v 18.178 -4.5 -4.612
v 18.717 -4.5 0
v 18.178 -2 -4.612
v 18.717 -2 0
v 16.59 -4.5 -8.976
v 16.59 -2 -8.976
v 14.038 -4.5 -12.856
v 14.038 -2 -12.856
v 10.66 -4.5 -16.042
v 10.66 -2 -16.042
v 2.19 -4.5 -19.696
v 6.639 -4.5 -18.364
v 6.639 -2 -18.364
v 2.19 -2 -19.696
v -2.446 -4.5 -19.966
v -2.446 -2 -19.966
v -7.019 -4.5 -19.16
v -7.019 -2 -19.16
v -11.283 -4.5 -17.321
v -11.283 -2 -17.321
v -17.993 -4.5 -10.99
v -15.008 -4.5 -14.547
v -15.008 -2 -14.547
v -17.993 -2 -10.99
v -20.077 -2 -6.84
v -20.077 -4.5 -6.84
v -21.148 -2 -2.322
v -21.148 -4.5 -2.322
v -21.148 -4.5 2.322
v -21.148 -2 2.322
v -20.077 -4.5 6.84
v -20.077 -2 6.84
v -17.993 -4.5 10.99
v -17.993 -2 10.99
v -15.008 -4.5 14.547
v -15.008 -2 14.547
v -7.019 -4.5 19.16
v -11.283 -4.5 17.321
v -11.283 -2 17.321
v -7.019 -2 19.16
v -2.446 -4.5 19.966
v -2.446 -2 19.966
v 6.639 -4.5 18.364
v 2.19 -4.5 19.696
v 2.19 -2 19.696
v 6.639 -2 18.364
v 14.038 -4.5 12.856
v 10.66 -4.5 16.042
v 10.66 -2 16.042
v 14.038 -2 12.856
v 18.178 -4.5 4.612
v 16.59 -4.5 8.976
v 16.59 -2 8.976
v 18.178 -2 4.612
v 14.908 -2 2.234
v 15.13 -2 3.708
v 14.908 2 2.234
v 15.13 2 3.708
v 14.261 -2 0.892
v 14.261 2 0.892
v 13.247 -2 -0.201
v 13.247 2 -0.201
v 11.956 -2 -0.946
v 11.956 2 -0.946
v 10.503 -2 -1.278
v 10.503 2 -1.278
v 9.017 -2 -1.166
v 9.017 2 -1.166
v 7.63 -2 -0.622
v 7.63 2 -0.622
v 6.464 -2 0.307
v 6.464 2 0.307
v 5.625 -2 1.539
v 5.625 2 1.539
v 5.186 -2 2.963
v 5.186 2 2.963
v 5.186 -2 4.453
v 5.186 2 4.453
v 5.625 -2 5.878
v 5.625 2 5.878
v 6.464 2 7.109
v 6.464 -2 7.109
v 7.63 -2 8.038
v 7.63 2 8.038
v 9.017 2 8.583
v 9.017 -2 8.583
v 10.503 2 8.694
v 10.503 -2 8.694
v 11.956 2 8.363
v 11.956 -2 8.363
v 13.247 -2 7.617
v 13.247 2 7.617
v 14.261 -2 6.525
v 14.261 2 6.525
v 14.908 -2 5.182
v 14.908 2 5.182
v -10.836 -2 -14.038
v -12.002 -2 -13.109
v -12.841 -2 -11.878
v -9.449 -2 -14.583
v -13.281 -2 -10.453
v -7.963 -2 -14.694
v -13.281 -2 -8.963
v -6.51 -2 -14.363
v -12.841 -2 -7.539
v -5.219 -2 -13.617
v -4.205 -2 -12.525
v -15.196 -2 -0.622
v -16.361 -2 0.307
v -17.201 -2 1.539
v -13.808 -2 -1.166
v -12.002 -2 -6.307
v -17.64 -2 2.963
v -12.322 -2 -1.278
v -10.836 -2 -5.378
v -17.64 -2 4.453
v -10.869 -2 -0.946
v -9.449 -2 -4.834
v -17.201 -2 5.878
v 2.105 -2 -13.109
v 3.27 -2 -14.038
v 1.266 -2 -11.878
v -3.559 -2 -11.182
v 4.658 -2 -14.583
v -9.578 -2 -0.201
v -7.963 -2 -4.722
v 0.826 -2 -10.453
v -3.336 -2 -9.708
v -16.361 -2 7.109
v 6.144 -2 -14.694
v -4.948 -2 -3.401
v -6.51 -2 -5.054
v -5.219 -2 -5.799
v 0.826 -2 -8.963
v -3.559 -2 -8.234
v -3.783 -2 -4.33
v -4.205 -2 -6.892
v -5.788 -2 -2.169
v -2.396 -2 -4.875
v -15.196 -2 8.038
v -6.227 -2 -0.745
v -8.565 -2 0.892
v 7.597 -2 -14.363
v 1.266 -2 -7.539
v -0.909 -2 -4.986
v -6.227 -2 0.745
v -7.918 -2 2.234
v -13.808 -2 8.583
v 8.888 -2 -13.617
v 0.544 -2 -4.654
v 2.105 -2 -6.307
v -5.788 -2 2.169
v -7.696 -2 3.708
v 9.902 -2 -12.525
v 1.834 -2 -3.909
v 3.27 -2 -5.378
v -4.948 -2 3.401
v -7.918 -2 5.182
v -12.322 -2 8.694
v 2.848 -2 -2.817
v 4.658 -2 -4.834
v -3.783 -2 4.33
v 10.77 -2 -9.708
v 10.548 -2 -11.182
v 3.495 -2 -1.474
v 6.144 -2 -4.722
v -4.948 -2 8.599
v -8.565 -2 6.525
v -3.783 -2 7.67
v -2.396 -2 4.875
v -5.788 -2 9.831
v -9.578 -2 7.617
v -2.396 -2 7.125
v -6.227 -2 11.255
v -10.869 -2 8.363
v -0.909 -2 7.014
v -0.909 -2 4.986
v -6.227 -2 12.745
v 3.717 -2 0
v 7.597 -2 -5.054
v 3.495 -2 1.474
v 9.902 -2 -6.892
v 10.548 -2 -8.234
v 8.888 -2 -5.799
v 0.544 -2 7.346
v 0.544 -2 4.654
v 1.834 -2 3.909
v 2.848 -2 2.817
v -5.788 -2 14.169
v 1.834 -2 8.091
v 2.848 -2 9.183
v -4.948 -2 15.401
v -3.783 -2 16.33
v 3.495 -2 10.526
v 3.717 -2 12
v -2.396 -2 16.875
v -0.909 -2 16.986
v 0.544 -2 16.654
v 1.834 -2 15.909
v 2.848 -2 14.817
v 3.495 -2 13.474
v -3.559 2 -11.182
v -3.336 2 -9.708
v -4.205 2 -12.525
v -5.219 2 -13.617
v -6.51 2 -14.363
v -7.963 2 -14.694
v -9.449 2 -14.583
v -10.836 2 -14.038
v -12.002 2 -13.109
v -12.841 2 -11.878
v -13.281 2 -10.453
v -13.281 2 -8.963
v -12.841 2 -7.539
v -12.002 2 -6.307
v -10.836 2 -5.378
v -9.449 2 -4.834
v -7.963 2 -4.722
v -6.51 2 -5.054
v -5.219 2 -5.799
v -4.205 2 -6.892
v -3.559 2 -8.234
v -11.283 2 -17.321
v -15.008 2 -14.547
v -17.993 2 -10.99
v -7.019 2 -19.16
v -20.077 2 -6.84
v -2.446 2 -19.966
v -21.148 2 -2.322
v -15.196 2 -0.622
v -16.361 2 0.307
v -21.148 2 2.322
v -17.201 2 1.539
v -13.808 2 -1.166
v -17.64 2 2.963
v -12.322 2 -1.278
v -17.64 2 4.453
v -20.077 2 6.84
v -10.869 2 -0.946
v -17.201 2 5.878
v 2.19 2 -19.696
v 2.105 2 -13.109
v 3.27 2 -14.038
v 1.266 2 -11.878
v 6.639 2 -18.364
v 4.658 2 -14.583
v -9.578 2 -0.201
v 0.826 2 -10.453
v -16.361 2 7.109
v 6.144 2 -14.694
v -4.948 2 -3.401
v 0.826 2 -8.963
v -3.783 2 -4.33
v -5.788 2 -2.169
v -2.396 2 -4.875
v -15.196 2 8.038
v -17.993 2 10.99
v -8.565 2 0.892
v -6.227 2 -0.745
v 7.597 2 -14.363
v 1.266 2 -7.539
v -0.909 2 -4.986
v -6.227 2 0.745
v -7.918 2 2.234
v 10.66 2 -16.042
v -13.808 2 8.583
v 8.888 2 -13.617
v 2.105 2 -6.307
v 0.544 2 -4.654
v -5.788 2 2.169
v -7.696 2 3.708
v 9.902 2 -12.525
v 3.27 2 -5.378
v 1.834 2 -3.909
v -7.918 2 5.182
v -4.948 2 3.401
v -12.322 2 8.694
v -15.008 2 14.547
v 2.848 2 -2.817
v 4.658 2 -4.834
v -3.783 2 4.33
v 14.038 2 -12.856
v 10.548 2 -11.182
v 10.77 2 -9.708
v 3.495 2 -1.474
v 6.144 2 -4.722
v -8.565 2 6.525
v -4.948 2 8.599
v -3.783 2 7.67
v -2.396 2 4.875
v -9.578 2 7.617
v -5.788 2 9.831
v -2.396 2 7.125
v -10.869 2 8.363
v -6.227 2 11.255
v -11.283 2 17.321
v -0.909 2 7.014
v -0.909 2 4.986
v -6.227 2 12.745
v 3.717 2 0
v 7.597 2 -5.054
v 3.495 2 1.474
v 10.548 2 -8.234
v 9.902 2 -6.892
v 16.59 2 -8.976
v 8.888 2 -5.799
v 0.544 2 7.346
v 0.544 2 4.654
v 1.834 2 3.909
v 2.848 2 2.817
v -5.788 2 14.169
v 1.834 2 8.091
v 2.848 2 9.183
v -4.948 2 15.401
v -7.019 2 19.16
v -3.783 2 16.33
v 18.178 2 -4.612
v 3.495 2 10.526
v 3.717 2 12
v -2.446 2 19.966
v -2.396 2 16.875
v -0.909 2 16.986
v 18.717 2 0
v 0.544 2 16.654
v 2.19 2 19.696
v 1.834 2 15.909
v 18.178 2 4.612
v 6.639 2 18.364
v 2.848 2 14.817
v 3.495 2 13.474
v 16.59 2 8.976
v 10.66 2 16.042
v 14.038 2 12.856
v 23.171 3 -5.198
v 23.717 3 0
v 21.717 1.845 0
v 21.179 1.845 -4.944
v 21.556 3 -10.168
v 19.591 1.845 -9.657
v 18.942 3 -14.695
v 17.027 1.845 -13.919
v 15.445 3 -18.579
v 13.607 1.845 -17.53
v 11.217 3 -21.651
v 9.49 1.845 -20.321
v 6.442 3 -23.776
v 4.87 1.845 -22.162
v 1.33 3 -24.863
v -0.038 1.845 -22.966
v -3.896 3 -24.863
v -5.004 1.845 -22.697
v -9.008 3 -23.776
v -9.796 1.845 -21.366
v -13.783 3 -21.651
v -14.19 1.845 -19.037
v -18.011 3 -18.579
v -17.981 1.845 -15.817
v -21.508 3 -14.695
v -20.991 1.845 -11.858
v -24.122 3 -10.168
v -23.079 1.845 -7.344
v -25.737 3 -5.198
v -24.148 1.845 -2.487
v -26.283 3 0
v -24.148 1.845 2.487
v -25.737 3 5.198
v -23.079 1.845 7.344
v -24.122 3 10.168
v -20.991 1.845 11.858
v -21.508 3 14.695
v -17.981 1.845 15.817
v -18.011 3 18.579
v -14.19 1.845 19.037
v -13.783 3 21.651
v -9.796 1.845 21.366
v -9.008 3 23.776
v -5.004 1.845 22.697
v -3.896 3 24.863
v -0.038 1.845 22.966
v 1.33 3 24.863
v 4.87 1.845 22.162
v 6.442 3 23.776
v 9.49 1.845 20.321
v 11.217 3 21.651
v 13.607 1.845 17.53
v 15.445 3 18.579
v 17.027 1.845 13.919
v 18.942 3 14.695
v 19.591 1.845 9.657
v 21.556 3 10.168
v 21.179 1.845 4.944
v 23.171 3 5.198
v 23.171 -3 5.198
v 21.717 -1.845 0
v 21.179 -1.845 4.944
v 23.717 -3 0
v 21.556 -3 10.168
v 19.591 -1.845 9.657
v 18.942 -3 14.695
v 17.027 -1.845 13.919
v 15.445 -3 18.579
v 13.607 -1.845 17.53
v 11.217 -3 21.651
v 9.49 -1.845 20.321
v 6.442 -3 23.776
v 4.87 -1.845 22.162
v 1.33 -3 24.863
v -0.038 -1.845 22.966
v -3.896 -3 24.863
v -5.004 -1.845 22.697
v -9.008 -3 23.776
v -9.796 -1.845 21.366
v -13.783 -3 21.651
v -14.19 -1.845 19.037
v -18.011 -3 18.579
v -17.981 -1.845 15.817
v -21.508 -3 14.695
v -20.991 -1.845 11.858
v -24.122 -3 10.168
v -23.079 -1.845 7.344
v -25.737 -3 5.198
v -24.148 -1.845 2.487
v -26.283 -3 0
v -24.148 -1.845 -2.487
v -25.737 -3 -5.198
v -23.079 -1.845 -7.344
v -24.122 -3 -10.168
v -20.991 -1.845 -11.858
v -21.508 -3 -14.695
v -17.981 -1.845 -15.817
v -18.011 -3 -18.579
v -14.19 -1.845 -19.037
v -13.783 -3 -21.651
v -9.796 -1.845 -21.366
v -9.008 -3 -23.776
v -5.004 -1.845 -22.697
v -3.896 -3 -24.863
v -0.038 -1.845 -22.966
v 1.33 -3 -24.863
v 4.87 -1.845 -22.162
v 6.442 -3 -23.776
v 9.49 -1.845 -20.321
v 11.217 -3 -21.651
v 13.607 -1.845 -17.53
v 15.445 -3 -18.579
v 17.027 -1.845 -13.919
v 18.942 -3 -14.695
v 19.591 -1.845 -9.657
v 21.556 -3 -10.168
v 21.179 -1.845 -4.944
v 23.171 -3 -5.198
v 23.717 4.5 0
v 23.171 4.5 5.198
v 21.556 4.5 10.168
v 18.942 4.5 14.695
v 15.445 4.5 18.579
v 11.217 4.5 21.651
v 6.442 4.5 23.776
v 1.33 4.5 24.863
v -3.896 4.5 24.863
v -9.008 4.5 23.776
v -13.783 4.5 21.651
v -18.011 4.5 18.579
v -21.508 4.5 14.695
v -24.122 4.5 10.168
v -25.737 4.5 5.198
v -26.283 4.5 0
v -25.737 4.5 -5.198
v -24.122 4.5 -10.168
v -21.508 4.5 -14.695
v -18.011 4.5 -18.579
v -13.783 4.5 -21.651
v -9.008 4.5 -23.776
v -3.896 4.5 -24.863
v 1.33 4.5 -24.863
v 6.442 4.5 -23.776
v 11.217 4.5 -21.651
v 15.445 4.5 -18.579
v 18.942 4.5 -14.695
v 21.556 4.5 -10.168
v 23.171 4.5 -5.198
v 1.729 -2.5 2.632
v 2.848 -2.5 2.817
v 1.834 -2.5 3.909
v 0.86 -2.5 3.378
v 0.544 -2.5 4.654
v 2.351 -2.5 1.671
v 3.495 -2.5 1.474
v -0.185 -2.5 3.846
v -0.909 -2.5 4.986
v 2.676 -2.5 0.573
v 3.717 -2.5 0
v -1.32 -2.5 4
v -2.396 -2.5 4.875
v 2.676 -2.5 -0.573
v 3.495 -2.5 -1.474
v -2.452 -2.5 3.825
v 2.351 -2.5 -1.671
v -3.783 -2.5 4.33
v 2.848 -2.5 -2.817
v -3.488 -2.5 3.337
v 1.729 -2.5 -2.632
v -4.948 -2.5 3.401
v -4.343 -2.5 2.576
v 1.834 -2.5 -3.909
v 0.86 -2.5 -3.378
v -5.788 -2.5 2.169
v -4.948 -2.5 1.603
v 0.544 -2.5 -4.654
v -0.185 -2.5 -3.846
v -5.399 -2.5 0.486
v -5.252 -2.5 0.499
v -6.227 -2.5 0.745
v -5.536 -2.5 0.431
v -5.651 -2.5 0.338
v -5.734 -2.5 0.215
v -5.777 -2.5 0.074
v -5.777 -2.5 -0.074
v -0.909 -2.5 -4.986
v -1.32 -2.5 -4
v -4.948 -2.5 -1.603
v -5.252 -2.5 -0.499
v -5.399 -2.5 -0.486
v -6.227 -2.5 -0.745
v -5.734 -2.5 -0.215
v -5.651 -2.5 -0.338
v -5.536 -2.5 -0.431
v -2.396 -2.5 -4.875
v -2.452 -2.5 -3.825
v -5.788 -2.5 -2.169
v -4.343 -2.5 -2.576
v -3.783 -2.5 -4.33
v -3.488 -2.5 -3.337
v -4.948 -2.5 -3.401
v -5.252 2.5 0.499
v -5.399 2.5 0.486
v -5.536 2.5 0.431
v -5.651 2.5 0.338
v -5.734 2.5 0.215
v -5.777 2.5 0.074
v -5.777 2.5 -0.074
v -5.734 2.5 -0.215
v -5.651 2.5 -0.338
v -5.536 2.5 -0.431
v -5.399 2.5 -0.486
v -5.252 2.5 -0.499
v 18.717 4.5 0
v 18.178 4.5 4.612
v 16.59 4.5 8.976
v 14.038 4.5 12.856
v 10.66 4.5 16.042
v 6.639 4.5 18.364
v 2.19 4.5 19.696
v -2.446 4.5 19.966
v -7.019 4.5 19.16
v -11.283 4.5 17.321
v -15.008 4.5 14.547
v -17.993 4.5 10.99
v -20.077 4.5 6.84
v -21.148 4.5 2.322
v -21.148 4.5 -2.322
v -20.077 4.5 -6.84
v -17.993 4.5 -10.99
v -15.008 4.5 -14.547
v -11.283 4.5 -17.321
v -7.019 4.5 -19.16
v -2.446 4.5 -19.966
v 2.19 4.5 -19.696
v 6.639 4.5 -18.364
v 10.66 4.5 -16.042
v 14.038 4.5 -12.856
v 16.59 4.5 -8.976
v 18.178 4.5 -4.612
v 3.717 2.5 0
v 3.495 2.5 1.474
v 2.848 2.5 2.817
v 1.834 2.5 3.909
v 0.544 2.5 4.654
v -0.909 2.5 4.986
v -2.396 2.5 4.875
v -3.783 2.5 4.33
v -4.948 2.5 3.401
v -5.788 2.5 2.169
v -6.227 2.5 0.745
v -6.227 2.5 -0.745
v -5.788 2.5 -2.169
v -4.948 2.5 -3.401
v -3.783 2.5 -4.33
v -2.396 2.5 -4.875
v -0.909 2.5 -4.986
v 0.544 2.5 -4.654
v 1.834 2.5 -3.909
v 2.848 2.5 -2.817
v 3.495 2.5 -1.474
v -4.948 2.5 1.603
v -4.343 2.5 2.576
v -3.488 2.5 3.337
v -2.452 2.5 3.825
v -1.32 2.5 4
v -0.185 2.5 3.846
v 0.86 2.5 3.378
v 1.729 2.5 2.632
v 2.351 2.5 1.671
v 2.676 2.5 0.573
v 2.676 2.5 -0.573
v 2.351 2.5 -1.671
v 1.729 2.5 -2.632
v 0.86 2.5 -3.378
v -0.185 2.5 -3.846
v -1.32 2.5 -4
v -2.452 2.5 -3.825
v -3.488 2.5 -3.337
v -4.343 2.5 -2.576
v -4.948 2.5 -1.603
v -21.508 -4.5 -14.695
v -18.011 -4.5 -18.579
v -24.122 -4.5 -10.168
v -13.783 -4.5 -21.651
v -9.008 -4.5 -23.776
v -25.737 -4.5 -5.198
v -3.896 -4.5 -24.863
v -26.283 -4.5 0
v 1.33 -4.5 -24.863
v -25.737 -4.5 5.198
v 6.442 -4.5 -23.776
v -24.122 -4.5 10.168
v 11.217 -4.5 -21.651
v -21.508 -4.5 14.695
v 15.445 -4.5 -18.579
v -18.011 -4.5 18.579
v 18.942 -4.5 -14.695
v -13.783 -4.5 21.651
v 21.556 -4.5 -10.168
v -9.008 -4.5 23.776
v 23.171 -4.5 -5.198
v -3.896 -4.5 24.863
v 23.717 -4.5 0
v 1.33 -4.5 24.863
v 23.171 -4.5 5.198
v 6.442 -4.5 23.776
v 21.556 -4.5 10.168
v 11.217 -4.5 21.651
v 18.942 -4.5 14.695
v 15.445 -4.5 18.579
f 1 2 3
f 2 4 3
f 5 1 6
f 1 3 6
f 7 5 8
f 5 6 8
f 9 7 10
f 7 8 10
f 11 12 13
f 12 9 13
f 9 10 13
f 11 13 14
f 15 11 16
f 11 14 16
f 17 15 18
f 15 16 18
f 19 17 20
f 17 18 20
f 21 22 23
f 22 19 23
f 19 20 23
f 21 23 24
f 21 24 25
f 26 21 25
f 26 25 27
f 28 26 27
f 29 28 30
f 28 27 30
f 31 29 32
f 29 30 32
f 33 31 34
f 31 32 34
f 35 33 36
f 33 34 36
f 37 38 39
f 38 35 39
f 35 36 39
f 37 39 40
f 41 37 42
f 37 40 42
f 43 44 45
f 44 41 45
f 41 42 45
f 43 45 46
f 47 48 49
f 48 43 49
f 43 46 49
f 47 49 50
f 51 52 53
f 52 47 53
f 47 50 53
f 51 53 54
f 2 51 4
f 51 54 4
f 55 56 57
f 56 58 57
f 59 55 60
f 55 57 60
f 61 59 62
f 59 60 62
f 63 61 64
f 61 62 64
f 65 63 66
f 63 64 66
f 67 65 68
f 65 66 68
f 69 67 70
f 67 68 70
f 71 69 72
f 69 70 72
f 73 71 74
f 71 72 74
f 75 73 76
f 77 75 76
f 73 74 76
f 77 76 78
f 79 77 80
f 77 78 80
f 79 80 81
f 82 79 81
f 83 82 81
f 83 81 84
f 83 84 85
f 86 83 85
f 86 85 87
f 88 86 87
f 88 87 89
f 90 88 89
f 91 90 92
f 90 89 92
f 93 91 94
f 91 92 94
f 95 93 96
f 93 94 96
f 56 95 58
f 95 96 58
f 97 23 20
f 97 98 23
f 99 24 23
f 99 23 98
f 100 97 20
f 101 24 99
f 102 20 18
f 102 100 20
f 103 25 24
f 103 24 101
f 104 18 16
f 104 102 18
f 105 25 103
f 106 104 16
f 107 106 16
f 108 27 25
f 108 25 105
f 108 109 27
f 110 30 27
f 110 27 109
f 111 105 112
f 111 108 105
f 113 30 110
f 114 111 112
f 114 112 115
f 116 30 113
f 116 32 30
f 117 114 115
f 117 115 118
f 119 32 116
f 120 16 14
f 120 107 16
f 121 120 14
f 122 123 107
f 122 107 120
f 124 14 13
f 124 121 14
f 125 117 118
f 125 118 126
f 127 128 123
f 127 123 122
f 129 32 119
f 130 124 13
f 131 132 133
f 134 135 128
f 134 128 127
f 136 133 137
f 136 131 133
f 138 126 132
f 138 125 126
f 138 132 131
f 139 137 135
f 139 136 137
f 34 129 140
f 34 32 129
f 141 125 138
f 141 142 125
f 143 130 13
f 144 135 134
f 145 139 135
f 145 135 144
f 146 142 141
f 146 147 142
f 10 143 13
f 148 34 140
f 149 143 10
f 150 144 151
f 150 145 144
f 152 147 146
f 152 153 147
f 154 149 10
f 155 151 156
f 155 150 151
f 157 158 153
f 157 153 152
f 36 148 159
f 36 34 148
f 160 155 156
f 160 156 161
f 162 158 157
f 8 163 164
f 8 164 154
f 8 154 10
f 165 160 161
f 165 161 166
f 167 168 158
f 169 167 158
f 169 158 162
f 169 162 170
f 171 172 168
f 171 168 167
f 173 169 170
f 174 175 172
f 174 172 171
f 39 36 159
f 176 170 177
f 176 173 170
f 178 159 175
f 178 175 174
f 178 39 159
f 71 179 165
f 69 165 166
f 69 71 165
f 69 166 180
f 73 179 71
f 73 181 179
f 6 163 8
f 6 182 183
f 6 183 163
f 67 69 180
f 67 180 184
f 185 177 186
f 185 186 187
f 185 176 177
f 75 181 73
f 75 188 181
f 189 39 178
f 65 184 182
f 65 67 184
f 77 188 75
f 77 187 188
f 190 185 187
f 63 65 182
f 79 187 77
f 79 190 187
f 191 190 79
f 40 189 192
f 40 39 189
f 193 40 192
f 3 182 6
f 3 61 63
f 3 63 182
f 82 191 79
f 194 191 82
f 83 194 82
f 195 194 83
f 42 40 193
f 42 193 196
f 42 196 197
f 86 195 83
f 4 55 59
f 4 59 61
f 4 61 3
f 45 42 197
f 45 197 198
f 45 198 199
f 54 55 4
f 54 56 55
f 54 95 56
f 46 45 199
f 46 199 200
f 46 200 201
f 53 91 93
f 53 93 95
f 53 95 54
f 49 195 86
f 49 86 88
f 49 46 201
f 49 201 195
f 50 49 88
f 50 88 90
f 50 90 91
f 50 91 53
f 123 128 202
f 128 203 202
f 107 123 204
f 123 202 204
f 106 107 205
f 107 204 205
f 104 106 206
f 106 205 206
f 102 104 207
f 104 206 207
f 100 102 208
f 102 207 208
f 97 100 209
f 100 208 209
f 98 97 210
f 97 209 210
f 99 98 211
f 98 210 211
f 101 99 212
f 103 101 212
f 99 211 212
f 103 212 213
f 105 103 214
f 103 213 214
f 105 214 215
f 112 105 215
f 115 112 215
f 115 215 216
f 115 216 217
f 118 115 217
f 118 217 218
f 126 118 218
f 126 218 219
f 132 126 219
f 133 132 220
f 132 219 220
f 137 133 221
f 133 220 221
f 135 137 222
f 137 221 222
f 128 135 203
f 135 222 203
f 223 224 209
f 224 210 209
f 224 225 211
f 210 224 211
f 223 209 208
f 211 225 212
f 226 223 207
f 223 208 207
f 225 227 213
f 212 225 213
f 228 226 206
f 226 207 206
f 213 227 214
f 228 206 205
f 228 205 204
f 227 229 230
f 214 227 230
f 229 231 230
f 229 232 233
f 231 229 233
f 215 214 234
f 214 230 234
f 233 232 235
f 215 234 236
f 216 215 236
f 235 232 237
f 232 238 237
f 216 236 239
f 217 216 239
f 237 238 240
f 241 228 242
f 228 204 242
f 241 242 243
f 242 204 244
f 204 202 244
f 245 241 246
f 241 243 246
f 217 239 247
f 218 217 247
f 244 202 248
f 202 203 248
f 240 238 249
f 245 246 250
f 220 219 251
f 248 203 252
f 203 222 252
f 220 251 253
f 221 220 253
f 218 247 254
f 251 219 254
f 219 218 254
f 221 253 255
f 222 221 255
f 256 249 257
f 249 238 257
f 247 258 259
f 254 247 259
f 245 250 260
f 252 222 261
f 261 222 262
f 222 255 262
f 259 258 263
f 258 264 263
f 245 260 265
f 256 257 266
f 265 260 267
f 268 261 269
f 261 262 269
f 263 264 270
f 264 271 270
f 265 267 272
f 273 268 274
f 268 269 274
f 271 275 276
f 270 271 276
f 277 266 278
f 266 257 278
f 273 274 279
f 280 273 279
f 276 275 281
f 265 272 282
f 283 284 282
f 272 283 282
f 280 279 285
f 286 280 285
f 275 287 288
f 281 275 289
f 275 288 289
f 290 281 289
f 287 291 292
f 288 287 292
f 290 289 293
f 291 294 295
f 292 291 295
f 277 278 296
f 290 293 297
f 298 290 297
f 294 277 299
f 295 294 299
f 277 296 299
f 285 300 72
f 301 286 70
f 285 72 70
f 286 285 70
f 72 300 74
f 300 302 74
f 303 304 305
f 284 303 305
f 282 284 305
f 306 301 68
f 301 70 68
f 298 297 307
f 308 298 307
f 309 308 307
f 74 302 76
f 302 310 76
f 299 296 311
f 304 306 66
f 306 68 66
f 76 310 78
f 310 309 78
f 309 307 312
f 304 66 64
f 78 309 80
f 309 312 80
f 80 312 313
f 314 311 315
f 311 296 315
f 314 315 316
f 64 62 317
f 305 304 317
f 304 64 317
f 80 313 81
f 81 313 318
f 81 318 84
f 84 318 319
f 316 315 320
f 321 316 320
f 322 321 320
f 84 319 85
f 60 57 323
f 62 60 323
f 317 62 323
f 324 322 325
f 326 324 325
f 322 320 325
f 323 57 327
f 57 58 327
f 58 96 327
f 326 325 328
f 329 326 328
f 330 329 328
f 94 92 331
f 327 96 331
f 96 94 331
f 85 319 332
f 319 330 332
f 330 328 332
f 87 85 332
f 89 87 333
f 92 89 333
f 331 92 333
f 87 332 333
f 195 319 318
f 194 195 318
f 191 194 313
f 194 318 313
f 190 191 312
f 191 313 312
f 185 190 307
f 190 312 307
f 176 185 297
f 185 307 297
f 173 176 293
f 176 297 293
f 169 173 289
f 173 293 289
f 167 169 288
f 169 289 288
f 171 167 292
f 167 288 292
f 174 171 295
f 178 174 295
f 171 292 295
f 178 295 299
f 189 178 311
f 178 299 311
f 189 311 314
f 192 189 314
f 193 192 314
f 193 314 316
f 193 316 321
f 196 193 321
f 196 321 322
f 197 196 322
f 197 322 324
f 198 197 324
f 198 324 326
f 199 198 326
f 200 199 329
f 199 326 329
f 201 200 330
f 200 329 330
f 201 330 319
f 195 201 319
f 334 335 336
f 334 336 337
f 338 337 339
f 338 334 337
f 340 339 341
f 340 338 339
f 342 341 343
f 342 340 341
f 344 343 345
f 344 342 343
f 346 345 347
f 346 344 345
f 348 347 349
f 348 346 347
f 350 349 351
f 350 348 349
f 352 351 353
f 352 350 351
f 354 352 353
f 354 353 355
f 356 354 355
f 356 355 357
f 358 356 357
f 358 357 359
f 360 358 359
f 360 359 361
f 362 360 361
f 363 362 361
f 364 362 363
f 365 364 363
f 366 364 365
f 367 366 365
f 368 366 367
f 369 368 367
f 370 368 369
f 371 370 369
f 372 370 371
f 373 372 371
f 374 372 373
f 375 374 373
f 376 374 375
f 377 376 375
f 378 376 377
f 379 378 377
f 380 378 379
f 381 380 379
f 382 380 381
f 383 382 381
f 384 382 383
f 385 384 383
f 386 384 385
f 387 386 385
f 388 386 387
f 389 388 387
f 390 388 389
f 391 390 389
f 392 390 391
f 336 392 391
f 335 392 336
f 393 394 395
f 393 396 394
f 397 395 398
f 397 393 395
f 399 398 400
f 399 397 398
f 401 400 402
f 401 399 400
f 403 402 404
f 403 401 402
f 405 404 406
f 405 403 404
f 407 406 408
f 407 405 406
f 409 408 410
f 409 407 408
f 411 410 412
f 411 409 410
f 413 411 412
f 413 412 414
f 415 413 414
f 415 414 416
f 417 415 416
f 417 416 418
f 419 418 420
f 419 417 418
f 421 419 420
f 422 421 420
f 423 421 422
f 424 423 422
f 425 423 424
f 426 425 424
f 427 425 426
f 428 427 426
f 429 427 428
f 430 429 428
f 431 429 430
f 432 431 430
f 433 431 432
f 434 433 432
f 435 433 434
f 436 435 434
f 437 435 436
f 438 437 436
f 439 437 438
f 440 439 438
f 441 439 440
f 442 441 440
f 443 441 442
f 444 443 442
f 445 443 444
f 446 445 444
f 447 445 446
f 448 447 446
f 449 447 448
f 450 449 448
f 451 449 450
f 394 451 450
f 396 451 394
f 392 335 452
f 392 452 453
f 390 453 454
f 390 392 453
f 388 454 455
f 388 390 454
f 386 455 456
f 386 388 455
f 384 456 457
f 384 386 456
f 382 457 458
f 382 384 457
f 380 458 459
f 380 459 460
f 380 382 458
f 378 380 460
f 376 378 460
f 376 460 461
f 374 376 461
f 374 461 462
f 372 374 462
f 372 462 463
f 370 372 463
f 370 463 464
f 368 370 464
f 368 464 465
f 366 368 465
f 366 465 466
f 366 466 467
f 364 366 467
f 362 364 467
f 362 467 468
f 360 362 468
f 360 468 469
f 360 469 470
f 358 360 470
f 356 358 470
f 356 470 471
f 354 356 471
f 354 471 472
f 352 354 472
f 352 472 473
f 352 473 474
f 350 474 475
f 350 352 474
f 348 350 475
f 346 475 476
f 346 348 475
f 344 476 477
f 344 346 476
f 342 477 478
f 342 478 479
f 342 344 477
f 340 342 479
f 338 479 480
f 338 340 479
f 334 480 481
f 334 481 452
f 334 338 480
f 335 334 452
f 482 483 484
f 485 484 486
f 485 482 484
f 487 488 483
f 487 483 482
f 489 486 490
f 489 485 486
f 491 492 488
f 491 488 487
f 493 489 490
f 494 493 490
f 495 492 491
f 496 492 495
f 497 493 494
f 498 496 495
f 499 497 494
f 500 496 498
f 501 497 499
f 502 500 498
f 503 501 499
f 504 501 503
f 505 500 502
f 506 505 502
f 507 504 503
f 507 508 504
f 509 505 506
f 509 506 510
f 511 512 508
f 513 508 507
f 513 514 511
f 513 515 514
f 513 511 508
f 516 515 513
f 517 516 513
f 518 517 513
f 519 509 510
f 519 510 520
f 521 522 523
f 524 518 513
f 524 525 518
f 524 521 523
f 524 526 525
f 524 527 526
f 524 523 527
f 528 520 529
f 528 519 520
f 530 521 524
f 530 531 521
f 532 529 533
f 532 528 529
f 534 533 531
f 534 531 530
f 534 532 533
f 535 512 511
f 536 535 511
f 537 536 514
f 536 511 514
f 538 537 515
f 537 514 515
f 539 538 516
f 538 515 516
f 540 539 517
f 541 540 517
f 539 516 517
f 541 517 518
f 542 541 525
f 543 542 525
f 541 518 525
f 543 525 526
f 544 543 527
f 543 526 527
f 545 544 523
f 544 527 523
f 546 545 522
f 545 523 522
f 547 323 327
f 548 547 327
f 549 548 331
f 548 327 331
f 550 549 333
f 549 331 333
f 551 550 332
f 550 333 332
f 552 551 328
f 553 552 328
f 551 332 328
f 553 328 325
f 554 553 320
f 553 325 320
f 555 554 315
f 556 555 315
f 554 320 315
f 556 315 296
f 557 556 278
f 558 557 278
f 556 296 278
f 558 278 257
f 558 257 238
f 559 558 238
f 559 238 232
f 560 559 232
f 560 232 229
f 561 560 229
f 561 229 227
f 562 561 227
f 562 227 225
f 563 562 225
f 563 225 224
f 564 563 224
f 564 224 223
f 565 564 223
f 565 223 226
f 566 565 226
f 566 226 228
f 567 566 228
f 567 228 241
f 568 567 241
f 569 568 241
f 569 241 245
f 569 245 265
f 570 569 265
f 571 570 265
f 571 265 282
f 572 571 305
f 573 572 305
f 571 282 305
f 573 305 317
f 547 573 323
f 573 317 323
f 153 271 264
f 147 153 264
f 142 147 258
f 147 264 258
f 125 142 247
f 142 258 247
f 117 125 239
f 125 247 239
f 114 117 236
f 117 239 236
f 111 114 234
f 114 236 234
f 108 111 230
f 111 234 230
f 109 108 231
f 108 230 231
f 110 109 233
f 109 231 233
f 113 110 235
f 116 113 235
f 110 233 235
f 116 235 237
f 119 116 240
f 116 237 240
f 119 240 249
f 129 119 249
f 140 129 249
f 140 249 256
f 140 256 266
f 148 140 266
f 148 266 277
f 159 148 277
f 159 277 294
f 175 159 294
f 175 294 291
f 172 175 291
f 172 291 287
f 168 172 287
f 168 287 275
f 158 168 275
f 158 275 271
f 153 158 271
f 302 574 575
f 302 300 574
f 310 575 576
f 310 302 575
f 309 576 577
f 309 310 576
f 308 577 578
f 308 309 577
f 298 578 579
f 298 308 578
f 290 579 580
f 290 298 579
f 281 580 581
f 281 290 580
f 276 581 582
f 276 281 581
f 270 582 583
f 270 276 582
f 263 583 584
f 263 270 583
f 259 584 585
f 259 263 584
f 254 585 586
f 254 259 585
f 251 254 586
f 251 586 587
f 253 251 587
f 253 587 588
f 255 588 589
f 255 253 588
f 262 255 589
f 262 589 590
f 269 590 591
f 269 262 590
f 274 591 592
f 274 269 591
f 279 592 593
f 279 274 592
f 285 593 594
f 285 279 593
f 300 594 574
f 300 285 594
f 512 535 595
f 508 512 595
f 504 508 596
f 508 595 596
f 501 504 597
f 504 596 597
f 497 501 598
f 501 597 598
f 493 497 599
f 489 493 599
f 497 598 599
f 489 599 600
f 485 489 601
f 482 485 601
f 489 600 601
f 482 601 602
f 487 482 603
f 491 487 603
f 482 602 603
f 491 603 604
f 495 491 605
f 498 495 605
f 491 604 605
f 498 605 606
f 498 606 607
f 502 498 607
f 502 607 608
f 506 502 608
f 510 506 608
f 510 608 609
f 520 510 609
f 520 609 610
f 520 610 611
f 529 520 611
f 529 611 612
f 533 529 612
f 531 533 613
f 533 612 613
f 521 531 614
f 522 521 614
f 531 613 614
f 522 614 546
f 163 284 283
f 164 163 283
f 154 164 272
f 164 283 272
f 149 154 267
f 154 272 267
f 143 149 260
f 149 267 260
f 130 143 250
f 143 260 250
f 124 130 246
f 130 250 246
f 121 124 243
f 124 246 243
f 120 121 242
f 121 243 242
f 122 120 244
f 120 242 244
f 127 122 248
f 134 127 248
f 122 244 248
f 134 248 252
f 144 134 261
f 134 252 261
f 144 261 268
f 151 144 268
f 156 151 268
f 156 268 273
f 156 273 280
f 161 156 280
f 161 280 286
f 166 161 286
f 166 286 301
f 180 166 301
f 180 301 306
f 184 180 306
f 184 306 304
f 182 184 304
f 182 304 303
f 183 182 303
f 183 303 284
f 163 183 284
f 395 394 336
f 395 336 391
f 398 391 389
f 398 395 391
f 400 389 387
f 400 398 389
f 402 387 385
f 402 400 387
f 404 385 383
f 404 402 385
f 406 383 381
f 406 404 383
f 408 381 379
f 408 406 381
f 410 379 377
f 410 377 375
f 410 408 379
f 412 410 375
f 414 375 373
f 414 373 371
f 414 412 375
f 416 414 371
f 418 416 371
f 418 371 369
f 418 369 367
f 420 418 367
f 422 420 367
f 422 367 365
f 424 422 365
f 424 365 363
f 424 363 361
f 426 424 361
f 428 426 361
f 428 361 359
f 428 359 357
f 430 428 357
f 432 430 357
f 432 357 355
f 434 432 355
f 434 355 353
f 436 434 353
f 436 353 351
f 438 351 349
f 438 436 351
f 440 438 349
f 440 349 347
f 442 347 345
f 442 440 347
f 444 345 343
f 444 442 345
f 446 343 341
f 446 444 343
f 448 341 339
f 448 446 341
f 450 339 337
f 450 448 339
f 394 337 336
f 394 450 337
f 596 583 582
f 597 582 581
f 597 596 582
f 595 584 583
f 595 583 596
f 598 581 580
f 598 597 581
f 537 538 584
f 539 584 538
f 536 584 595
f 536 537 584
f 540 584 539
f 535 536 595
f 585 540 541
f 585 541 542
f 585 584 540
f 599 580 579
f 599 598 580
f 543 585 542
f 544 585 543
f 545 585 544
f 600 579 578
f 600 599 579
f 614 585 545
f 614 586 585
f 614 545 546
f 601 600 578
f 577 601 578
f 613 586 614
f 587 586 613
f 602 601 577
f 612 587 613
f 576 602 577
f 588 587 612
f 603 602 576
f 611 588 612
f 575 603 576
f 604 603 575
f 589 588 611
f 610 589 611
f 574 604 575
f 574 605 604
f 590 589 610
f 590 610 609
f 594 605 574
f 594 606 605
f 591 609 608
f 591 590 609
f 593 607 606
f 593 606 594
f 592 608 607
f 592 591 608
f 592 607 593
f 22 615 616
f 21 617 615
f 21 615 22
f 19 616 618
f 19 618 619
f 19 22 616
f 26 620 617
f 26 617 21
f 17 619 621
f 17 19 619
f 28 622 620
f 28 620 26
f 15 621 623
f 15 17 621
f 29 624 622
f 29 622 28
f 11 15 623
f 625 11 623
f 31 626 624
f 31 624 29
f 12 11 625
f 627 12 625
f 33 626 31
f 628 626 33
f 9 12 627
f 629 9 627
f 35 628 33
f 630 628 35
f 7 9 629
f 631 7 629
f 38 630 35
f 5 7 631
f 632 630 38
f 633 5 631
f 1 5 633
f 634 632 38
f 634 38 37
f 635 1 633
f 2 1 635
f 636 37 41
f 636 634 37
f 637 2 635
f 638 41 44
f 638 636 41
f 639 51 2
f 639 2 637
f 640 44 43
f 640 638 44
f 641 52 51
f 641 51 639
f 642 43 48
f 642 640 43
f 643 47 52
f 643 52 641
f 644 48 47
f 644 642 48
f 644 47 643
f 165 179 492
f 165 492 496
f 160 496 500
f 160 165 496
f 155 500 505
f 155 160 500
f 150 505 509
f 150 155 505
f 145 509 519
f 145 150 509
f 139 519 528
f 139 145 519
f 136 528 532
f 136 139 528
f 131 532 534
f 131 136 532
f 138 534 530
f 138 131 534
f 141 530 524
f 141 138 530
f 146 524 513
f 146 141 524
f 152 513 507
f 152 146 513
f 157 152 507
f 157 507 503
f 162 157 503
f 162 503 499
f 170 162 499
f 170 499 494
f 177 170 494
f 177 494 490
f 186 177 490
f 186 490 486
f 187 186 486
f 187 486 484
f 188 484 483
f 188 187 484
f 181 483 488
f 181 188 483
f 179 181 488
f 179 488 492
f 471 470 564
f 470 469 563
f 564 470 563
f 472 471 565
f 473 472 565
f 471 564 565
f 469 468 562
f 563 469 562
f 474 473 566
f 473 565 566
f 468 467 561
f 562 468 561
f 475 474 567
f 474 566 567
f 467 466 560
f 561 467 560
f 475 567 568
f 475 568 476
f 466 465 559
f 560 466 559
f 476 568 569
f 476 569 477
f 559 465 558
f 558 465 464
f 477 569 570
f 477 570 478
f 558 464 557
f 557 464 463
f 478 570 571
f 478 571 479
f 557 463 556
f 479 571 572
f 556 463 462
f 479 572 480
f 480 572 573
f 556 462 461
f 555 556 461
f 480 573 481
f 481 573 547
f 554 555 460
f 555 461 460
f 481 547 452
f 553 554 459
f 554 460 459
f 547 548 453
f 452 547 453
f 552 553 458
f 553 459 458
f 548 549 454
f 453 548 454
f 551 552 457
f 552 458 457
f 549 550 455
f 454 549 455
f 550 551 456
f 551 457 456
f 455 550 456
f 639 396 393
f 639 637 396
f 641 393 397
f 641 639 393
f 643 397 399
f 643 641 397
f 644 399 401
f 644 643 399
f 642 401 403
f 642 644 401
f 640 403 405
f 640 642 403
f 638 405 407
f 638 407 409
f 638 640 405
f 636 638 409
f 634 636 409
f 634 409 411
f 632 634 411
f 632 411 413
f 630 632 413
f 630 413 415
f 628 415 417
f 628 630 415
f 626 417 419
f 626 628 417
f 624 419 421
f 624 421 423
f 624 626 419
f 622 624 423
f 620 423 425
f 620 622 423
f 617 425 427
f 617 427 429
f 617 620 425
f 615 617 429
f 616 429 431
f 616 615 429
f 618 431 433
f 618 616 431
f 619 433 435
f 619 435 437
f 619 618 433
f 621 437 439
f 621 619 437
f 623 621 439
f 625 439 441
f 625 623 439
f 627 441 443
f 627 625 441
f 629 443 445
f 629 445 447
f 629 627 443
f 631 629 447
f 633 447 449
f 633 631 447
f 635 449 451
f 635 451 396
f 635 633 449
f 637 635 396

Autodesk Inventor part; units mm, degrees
ref_plane "YZ Plane" through (0, 0, 0) normal (1, 0, 0) x (0, 1, 0)
ref_plane "XZ Plane" through (0, 0, 0) normal (0, 1, 0) x (-1, 0, 0)
ref_plane "XY Plane" through (0, 0, 0) normal (0, 0, 1) x (1, 0, 0)
sketch "Sketch1" plane through (0, 0, 0) normal (0, 0, 1) x (1, 0, 0)
  line L0 (-1.283, 24.9016) -> (-1.283, -22.4465)
  line L1 (23.717, 4.5) -> (23.717, -4.5)
  line L2 (23.717, -4.5) -> (18.717, -4.5)
  line L3 (18.717, -4.5) -> (18.717, -2)
  line L4 (18.717, -2) -> (2.717, -2)
  line L5 (23.717, 4.5) -> (18.717, 4.5)
  line L6 (18.717, 4.5) -> (18.717, 2)
  line L7 (18.717, 2) -> (2.717, 2)
  line L8 (2.717, 2) -> (2.717, -2)
  line L9 (23.717, 3) -> (21.717, 1.8453)
  line L10 (21.717, 1.8453) -> (21.717, -1.8453)
  line L11 (21.717, -1.8453) -> (23.717, -3)
  point P0 (0, 0)
  point P1 (18.717, 3.25)
  point P2 (18.717, -3.25)
  point P3 (2.717, 0)
  dimension "d0" = 50
  dimension "d1" = 8
  dimension "d2" = 5
  dimension "d3" = 9
  dimension "d4" = 1.5
  dimension "d5" = 1.5
  dimension "d6" = 60
  dimension "d7" = 2
  dimension "d20" = 4
revolve "Revolution1" add sketch "Sketch1" angle 360 about axis through (-1.283, 24.9016, 0) along (0, -1, 0) contours L1 L9 L10 L11 L2 L3 L4 L8 L7 L6 L5
sketch "Sketch2" plane through (-1.283, 2, 0) normal (0, 1, 0) x (1, 0, 0)
  circle A0 centre (0, 0) radius 12 construction
  circle A1 centre (0, -12) radius 5
  circle A2 centre (11.4127, -3.7082) radius 5
  circle A3 centre (0, 0) radius 12 construction
  circle A4 centre (7.0534, 9.7082) radius 5
  circle A5 centre (0, 0) radius 12 construction
  circle A6 centre (-7.0534, 9.7082) radius 5
  circle A7 centre (0, 0) radius 12 construction
  circle A8 centre (-11.4127, -3.7082) radius 5
  circle A9 centre (0, 0) radius 12 construction
  point P0 (1.283, 0)
  dimension "d9" = 24
  dimension "d10" = 10
  dimension "d13" = 360
extrude "Extrusion1" cut sketch "Sketch2" against normal through all
sketch "Sketch3" plane through (-1.283, 2, 0) normal (0, 1, 0) x (1, 0, 0)
  circle A0 centre (0, 0) radius 5
  circle A1 centre (0, 0) radius 4
  point P0 (1.283, 0)
  dimension "d17" = 10
extrude "Extrusion2" add sketch "Sketch3" along normal blind 0.5
mirror "Mirror1" about plane through (0, 0, 0) normal (0, 1, 0) of "Extrusion2"
sketch "Sketch4" plane through (-1.283, -2.5, 0) normal (0, -1, 0) x (1, 0, 0)
  circle A0 centre (0, 0) radius 4 projected
  circle A1 centre (-4, 0) radius 0.5
  point P0 (1.283, 0)
  point P1 (-3.9688, -0.499)
  point P2 (-3.9688, 0.499)
  dimension "d21" = 1
  dimension "d22" = 4
extrude "Extrusion3" cut sketch "Sketch4" against normal through all contours A0 A1 picked at (-4.1643, 0)
properties part number "Pulley lớn" material "Iron, Cast"
